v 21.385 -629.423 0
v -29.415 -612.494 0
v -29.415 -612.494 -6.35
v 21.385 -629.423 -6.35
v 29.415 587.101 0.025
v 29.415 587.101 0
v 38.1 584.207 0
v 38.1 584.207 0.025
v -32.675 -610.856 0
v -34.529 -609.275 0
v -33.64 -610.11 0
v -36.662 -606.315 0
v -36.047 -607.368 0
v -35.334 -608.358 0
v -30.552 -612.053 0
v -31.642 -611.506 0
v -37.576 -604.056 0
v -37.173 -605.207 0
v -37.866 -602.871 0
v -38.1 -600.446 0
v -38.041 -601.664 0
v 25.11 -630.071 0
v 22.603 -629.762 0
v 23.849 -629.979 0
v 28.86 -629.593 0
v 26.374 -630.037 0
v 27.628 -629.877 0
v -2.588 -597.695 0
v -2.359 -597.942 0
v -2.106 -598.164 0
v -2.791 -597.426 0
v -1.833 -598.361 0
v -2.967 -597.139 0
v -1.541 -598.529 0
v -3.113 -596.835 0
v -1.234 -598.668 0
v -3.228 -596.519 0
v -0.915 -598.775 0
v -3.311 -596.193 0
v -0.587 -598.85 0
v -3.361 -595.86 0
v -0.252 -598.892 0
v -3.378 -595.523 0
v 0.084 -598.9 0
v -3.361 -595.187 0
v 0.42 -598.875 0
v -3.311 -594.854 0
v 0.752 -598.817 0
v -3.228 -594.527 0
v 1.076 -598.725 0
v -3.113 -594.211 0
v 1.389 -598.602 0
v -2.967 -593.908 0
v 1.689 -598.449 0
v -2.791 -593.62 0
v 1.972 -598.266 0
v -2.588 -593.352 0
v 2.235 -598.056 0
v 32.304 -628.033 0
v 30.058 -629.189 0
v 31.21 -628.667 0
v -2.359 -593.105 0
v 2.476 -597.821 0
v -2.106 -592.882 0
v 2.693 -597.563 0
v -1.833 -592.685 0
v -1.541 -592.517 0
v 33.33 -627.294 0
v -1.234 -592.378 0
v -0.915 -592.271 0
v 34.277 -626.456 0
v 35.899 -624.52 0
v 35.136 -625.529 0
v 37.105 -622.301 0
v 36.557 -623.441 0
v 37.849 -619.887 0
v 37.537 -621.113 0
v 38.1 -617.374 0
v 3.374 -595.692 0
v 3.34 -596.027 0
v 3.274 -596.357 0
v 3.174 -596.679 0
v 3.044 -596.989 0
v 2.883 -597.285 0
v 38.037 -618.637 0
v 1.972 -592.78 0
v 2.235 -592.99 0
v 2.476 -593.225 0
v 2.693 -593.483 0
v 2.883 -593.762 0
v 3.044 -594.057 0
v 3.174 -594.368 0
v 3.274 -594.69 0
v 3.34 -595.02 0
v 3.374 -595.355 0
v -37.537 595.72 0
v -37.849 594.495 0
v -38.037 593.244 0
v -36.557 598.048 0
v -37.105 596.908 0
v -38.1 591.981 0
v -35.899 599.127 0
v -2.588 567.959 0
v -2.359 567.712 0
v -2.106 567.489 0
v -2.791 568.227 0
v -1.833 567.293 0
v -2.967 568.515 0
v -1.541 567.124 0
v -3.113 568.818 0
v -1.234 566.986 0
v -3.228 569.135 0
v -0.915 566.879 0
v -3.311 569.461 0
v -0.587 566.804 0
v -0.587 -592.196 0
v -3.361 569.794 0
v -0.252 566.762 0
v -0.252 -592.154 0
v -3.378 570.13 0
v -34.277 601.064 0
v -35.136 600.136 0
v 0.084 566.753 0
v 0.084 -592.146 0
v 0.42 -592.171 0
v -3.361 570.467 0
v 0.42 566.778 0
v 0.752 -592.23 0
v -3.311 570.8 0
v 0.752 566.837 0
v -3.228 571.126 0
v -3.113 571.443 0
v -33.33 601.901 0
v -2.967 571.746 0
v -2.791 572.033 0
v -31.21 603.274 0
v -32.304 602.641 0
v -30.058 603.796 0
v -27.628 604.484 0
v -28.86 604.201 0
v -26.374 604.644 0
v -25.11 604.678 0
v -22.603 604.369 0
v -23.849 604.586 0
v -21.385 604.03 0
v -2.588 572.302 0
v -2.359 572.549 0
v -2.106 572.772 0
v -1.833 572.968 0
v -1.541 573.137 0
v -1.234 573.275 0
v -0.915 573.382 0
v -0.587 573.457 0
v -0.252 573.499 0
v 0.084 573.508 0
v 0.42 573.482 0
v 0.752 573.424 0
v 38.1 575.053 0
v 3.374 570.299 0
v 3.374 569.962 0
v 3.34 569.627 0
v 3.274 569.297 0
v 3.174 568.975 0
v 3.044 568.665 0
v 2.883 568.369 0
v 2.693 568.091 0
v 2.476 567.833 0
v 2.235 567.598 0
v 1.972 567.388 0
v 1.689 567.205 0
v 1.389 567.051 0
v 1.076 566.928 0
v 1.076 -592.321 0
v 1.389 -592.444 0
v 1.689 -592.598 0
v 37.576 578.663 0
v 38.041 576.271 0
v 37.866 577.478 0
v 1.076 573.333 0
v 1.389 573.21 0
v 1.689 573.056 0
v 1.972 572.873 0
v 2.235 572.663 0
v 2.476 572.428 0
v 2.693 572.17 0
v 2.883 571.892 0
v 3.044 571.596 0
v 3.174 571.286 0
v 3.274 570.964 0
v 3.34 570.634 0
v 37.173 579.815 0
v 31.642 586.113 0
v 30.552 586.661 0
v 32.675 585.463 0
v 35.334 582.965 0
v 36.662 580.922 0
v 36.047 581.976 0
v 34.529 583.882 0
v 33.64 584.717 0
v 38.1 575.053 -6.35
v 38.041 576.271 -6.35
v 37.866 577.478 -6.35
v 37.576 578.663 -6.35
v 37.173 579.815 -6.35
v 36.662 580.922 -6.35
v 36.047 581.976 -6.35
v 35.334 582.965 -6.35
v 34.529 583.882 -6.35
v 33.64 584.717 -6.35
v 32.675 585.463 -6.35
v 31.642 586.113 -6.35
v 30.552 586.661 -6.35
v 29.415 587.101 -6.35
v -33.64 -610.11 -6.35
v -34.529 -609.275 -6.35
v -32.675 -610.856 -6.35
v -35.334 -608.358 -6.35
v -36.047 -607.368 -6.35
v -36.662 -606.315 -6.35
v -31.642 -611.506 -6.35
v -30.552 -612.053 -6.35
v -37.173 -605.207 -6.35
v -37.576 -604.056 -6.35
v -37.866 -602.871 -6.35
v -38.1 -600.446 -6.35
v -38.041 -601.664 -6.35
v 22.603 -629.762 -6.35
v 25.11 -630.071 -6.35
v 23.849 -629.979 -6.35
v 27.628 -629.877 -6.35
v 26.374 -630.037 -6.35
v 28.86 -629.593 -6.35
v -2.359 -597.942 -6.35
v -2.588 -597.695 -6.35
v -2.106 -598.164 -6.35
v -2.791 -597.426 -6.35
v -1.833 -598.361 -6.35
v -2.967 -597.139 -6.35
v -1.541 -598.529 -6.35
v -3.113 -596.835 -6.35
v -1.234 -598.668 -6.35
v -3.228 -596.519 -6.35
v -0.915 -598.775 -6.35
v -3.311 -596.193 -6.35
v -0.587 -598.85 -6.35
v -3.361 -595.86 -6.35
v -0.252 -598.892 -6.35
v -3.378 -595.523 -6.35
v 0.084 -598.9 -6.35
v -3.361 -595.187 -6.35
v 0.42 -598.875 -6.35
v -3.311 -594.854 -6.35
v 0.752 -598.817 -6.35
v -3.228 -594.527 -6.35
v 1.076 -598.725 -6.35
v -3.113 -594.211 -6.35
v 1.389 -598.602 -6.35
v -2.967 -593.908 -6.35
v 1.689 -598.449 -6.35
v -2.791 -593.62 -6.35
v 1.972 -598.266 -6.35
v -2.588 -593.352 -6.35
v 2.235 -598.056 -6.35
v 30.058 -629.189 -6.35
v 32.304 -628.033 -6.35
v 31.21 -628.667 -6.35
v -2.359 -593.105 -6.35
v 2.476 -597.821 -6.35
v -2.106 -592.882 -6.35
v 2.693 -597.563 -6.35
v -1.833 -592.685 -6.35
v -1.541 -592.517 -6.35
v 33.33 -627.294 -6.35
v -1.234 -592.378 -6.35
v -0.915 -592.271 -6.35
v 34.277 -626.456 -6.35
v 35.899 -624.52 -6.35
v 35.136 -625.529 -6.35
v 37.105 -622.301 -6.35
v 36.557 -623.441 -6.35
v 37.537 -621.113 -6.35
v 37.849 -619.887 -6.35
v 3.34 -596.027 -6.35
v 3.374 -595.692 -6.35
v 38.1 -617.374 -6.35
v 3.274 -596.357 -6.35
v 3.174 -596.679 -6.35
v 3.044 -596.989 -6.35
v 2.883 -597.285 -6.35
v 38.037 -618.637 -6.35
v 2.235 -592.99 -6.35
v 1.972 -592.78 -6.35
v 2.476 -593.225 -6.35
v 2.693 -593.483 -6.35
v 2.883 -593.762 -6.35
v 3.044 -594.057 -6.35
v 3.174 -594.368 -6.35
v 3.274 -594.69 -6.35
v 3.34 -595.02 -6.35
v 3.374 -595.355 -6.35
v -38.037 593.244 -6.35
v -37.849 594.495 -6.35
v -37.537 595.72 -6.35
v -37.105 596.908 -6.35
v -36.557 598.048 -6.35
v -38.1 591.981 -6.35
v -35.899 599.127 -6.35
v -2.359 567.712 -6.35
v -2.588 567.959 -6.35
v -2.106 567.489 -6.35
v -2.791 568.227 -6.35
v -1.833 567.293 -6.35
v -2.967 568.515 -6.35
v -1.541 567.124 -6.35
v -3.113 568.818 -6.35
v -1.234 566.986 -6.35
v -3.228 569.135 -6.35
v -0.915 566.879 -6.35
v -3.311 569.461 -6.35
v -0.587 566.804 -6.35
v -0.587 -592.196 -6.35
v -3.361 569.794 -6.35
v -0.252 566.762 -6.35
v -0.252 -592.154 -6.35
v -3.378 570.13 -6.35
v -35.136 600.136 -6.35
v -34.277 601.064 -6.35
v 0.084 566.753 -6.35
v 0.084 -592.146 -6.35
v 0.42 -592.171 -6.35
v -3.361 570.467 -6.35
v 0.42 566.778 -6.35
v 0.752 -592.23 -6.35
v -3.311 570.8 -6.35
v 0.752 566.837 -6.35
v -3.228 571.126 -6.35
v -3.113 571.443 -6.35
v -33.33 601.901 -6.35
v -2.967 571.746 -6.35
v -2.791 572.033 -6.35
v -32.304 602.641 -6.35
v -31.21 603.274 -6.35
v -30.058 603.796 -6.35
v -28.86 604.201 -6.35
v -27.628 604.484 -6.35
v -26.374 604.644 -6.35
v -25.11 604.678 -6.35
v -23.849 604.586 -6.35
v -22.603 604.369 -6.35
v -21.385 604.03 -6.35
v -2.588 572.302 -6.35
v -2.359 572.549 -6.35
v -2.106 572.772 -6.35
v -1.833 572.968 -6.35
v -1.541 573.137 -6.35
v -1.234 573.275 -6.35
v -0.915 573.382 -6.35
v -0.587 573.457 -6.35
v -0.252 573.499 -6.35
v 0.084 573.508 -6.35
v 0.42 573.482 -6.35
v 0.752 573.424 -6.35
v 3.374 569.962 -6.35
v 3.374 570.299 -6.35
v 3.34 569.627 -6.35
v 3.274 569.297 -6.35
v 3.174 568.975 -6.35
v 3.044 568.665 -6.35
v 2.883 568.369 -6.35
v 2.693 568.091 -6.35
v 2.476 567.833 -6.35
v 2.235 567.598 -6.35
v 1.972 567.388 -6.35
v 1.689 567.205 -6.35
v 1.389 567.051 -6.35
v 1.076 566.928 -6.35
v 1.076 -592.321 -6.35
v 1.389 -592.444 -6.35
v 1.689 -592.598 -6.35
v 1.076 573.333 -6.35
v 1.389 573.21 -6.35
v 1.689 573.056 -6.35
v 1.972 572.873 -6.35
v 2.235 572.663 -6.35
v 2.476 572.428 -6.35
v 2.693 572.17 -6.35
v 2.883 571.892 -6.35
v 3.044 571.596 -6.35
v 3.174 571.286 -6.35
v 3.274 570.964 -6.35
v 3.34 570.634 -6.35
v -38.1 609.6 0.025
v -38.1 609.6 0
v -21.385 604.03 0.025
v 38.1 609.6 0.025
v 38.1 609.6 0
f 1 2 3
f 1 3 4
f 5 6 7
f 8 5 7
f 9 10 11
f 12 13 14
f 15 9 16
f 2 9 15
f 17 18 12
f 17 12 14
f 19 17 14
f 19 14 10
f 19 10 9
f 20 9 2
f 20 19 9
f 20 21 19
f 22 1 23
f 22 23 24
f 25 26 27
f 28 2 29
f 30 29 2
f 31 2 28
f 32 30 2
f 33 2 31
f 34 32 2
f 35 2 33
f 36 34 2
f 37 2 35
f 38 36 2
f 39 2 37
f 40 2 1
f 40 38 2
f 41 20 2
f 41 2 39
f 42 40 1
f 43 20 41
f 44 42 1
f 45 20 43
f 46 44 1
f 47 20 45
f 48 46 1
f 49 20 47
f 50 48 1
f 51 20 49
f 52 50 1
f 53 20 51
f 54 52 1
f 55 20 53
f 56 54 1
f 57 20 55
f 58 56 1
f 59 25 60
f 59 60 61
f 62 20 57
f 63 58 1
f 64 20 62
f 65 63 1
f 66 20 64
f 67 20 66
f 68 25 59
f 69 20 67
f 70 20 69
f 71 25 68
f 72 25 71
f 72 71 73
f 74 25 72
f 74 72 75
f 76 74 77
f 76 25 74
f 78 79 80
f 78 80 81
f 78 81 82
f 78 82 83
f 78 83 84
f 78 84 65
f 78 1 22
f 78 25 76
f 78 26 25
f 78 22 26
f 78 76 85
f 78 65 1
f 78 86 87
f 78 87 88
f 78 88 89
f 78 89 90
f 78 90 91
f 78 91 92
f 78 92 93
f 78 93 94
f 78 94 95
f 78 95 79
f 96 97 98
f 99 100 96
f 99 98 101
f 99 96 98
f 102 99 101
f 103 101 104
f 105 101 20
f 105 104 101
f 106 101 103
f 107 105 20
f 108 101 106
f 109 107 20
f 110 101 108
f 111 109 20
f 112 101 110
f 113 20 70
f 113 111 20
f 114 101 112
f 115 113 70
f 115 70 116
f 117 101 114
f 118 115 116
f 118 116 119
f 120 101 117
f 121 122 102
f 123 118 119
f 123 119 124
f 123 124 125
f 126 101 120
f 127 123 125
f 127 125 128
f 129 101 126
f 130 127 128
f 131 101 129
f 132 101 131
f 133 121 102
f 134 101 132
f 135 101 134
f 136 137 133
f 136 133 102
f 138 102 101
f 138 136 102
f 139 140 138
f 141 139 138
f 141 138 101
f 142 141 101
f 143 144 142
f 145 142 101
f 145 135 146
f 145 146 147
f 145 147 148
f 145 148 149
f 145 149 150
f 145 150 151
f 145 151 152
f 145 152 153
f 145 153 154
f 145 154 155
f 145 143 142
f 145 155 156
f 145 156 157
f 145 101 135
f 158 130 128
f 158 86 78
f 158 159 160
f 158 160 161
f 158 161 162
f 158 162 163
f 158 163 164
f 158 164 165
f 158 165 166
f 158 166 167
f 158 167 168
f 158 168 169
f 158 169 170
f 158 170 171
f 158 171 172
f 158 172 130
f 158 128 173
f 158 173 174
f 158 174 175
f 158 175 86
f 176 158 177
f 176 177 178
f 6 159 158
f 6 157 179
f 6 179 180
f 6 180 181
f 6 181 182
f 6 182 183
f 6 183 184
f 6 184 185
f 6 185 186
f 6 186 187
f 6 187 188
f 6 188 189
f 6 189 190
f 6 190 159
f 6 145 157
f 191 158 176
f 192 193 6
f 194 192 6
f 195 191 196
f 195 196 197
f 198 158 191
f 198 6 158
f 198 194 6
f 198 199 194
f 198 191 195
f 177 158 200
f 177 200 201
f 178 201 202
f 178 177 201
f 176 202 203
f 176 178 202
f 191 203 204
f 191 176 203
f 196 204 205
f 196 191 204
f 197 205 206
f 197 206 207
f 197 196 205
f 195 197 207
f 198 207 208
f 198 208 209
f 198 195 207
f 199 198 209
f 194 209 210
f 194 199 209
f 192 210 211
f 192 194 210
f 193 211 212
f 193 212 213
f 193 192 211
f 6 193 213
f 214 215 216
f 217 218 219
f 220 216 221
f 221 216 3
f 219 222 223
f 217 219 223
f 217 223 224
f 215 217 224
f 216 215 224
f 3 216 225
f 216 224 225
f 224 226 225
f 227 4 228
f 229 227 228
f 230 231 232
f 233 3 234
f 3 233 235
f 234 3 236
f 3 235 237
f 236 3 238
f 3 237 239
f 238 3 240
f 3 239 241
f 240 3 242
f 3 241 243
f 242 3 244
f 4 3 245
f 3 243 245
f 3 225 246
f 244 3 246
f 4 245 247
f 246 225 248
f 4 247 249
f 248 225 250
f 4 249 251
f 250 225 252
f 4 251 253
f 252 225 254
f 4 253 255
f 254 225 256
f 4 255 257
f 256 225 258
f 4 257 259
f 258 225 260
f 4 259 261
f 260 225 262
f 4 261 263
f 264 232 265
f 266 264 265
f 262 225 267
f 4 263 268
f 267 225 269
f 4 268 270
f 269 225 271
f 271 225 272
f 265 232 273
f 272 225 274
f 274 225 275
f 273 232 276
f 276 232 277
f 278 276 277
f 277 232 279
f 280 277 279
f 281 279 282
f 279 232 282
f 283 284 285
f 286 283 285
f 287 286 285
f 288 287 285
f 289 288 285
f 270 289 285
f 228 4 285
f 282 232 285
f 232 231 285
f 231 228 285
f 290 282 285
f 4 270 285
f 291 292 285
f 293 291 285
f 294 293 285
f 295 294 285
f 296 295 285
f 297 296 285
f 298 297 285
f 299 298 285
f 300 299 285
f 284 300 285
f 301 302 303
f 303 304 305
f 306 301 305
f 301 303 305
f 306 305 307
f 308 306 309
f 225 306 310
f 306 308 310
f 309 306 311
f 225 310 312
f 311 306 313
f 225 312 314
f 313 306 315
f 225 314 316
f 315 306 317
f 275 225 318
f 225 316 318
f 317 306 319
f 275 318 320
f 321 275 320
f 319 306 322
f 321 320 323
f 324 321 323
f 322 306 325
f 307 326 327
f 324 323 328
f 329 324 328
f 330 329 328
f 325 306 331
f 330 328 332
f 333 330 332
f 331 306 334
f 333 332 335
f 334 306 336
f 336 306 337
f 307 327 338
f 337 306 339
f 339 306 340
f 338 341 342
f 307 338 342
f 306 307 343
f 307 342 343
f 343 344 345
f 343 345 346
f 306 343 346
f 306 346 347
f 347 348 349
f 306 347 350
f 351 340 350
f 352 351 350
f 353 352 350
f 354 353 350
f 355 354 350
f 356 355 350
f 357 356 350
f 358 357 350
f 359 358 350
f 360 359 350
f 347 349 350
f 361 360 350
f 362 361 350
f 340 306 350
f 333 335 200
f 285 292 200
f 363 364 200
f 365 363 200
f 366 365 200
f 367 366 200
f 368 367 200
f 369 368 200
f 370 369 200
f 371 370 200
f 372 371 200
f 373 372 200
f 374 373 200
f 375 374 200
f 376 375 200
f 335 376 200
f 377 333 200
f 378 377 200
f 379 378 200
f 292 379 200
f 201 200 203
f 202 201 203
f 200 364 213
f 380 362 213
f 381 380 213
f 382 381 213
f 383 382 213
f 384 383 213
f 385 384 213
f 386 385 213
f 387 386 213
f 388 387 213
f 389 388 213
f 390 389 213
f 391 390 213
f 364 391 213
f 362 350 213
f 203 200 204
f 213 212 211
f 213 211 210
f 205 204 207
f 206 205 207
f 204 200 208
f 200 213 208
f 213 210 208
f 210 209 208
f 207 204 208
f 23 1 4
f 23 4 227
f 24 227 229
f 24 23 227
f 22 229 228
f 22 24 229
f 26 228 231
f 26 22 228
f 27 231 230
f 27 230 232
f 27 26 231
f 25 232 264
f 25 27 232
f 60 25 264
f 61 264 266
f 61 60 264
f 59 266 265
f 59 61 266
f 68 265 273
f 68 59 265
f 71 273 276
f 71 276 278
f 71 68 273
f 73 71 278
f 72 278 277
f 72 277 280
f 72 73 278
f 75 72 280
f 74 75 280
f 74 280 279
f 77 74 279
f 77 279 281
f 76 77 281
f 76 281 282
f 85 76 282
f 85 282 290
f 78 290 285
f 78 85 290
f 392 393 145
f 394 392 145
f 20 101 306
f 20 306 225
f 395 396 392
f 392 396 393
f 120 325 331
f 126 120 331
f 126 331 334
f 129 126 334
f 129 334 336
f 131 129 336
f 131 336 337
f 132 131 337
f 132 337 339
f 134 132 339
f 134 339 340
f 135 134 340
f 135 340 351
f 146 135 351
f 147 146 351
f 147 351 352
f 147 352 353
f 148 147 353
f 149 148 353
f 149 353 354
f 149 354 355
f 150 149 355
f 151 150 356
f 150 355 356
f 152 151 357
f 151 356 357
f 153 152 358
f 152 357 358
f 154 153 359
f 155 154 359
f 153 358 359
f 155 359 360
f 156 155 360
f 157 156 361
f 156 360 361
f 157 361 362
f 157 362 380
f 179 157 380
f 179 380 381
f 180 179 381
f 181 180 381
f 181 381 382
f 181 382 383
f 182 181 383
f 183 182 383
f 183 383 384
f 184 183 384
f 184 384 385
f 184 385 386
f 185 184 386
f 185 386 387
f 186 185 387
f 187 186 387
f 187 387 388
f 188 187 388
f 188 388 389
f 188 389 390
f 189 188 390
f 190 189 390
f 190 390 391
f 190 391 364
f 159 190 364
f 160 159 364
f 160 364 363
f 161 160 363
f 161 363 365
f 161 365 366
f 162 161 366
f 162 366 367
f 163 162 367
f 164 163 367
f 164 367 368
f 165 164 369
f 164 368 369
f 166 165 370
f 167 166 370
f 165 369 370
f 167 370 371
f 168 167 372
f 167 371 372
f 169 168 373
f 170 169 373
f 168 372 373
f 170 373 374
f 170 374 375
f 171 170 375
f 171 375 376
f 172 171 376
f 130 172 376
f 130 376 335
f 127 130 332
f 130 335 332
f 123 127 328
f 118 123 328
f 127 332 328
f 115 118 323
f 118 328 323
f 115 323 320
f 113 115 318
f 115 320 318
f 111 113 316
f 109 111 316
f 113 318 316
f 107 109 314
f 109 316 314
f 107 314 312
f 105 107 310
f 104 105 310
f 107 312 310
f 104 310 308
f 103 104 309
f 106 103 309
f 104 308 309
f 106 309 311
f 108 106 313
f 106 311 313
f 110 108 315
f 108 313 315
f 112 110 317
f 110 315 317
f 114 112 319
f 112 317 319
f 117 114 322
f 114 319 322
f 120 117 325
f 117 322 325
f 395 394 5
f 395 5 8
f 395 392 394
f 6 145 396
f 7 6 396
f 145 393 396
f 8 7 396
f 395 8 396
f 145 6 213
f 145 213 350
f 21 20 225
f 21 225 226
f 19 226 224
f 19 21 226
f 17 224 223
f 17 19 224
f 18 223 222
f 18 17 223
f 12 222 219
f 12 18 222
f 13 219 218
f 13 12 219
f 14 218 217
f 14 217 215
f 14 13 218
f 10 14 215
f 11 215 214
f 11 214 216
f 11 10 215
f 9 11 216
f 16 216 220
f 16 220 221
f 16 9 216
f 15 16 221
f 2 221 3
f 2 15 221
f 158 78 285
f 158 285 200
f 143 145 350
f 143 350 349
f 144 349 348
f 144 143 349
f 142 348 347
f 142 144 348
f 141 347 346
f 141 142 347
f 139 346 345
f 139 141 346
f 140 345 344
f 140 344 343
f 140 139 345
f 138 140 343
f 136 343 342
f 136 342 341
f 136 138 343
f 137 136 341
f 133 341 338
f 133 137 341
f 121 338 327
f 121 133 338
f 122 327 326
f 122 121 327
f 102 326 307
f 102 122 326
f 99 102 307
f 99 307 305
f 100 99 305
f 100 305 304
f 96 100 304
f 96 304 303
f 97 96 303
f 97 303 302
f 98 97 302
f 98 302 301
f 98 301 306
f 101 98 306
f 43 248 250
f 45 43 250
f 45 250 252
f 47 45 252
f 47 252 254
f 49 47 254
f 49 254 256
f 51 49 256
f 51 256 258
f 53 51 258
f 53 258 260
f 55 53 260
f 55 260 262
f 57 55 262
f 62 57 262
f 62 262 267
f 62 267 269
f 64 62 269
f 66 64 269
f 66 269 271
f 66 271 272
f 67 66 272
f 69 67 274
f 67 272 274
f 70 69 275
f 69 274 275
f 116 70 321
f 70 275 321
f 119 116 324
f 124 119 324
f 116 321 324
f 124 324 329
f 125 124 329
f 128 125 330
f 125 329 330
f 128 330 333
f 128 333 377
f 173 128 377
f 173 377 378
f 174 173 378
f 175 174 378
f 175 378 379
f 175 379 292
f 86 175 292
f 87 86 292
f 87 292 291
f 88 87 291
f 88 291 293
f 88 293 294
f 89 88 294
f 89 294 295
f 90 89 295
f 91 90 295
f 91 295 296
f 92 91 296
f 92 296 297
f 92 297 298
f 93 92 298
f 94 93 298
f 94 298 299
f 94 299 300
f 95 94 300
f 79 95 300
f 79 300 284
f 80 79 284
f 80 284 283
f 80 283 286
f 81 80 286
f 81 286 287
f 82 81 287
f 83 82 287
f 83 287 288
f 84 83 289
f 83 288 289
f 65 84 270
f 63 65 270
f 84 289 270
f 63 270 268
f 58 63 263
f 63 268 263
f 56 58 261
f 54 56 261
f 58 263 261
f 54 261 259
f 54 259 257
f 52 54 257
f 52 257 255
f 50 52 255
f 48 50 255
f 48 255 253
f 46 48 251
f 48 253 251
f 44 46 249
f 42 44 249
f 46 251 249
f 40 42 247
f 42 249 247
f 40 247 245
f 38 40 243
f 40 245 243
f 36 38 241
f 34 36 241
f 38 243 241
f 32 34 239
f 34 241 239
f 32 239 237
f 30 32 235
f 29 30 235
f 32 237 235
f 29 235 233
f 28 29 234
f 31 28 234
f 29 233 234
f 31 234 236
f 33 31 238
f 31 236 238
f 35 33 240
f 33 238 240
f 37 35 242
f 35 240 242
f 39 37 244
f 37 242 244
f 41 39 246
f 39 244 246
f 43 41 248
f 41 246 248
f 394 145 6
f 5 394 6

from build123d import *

# Parameters (mm, degrees)
F1_DEPTH = 6.35
F2_D     = 6.7564
F3_DEPTH = 0.0254


with BuildPart() as f1:
    # F0 (on Top) → F1 (new body)
    with BuildSketch(Plane.XY):
        with BuildLine():
            ThreePointArc((-21.3849480355, 604.0299201139), (-32.8262655504, 602.2837504366), (-38.1, 591.9812953906))
            Line((-38.1, 591.9812953906), (-38.1, 0))
            Line((-38.1, 0), (-38.1, -600.4455244823))
            ThreePointArc((-38.1, -600.4455244823), (-35.702455046, -607.8717900327), (-29.4150519645, -612.4941492056))
            Line((-29.4150519645, -612.4941492056), (21.3849480355, -629.4226073889))
            ThreePointArc((21.3849480355, -629.4226073889), (32.8262655504, -627.6764377116), (38.1, -617.3739826656))
            Line((38.1, -617.3739826656), (38.1, -25.392687275))
            Line((38.1, -25.392687275), (38.1, 575.0528372073))
            ThreePointArc((38.1, 575.0528372073), (35.702455046, 582.4791027577), (29.4150519645, 587.1014619306))
            Line((29.4150519645, 587.1014619306), (-21.3849480355, 604.0299201139))
        make_face()
        Polygon((-4.953, 0), (-4.953, 532.0304762354), (0, 532.0304762354), (4.953, 532.0304762354), (4.953, 0), (4.953, -557.4231635104), (0, -557.4231635104), (-4.953, -557.4231635104), align=None, mode=Mode.SUBTRACT)
        Polygon((0, 532.0304762354), (-4.953, 532.0304762354), (-4.953, 0), (-4.953, -557.4231635104), (0, -557.4231635104), (4.953, -557.4231635104), (4.953, 0), (4.953, 532.0304762354), align=None)
    extrude(amount=-F1_DEPTH)

    # F2 (through all)
    with Locations(Plane.XY):
        with Locations((0, 570.1304762354), (0, -595.5231635104)):
            Hole(F2_D / 2)


with BuildPart() as f3:
    # F0 (on Top) → F3 (new body)
    with BuildSketch(Plane.XY):
        Polygon((-38.1, 609.6), (-21.3849480355, 604.0299201139), (29.4150519645, 587.1014619306), (38.1, 584.207312725), (38.1, 609.6), align=None)
    extrude(amount=F3_DEPTH)


solid = Compound([f1.part, f3.part])
